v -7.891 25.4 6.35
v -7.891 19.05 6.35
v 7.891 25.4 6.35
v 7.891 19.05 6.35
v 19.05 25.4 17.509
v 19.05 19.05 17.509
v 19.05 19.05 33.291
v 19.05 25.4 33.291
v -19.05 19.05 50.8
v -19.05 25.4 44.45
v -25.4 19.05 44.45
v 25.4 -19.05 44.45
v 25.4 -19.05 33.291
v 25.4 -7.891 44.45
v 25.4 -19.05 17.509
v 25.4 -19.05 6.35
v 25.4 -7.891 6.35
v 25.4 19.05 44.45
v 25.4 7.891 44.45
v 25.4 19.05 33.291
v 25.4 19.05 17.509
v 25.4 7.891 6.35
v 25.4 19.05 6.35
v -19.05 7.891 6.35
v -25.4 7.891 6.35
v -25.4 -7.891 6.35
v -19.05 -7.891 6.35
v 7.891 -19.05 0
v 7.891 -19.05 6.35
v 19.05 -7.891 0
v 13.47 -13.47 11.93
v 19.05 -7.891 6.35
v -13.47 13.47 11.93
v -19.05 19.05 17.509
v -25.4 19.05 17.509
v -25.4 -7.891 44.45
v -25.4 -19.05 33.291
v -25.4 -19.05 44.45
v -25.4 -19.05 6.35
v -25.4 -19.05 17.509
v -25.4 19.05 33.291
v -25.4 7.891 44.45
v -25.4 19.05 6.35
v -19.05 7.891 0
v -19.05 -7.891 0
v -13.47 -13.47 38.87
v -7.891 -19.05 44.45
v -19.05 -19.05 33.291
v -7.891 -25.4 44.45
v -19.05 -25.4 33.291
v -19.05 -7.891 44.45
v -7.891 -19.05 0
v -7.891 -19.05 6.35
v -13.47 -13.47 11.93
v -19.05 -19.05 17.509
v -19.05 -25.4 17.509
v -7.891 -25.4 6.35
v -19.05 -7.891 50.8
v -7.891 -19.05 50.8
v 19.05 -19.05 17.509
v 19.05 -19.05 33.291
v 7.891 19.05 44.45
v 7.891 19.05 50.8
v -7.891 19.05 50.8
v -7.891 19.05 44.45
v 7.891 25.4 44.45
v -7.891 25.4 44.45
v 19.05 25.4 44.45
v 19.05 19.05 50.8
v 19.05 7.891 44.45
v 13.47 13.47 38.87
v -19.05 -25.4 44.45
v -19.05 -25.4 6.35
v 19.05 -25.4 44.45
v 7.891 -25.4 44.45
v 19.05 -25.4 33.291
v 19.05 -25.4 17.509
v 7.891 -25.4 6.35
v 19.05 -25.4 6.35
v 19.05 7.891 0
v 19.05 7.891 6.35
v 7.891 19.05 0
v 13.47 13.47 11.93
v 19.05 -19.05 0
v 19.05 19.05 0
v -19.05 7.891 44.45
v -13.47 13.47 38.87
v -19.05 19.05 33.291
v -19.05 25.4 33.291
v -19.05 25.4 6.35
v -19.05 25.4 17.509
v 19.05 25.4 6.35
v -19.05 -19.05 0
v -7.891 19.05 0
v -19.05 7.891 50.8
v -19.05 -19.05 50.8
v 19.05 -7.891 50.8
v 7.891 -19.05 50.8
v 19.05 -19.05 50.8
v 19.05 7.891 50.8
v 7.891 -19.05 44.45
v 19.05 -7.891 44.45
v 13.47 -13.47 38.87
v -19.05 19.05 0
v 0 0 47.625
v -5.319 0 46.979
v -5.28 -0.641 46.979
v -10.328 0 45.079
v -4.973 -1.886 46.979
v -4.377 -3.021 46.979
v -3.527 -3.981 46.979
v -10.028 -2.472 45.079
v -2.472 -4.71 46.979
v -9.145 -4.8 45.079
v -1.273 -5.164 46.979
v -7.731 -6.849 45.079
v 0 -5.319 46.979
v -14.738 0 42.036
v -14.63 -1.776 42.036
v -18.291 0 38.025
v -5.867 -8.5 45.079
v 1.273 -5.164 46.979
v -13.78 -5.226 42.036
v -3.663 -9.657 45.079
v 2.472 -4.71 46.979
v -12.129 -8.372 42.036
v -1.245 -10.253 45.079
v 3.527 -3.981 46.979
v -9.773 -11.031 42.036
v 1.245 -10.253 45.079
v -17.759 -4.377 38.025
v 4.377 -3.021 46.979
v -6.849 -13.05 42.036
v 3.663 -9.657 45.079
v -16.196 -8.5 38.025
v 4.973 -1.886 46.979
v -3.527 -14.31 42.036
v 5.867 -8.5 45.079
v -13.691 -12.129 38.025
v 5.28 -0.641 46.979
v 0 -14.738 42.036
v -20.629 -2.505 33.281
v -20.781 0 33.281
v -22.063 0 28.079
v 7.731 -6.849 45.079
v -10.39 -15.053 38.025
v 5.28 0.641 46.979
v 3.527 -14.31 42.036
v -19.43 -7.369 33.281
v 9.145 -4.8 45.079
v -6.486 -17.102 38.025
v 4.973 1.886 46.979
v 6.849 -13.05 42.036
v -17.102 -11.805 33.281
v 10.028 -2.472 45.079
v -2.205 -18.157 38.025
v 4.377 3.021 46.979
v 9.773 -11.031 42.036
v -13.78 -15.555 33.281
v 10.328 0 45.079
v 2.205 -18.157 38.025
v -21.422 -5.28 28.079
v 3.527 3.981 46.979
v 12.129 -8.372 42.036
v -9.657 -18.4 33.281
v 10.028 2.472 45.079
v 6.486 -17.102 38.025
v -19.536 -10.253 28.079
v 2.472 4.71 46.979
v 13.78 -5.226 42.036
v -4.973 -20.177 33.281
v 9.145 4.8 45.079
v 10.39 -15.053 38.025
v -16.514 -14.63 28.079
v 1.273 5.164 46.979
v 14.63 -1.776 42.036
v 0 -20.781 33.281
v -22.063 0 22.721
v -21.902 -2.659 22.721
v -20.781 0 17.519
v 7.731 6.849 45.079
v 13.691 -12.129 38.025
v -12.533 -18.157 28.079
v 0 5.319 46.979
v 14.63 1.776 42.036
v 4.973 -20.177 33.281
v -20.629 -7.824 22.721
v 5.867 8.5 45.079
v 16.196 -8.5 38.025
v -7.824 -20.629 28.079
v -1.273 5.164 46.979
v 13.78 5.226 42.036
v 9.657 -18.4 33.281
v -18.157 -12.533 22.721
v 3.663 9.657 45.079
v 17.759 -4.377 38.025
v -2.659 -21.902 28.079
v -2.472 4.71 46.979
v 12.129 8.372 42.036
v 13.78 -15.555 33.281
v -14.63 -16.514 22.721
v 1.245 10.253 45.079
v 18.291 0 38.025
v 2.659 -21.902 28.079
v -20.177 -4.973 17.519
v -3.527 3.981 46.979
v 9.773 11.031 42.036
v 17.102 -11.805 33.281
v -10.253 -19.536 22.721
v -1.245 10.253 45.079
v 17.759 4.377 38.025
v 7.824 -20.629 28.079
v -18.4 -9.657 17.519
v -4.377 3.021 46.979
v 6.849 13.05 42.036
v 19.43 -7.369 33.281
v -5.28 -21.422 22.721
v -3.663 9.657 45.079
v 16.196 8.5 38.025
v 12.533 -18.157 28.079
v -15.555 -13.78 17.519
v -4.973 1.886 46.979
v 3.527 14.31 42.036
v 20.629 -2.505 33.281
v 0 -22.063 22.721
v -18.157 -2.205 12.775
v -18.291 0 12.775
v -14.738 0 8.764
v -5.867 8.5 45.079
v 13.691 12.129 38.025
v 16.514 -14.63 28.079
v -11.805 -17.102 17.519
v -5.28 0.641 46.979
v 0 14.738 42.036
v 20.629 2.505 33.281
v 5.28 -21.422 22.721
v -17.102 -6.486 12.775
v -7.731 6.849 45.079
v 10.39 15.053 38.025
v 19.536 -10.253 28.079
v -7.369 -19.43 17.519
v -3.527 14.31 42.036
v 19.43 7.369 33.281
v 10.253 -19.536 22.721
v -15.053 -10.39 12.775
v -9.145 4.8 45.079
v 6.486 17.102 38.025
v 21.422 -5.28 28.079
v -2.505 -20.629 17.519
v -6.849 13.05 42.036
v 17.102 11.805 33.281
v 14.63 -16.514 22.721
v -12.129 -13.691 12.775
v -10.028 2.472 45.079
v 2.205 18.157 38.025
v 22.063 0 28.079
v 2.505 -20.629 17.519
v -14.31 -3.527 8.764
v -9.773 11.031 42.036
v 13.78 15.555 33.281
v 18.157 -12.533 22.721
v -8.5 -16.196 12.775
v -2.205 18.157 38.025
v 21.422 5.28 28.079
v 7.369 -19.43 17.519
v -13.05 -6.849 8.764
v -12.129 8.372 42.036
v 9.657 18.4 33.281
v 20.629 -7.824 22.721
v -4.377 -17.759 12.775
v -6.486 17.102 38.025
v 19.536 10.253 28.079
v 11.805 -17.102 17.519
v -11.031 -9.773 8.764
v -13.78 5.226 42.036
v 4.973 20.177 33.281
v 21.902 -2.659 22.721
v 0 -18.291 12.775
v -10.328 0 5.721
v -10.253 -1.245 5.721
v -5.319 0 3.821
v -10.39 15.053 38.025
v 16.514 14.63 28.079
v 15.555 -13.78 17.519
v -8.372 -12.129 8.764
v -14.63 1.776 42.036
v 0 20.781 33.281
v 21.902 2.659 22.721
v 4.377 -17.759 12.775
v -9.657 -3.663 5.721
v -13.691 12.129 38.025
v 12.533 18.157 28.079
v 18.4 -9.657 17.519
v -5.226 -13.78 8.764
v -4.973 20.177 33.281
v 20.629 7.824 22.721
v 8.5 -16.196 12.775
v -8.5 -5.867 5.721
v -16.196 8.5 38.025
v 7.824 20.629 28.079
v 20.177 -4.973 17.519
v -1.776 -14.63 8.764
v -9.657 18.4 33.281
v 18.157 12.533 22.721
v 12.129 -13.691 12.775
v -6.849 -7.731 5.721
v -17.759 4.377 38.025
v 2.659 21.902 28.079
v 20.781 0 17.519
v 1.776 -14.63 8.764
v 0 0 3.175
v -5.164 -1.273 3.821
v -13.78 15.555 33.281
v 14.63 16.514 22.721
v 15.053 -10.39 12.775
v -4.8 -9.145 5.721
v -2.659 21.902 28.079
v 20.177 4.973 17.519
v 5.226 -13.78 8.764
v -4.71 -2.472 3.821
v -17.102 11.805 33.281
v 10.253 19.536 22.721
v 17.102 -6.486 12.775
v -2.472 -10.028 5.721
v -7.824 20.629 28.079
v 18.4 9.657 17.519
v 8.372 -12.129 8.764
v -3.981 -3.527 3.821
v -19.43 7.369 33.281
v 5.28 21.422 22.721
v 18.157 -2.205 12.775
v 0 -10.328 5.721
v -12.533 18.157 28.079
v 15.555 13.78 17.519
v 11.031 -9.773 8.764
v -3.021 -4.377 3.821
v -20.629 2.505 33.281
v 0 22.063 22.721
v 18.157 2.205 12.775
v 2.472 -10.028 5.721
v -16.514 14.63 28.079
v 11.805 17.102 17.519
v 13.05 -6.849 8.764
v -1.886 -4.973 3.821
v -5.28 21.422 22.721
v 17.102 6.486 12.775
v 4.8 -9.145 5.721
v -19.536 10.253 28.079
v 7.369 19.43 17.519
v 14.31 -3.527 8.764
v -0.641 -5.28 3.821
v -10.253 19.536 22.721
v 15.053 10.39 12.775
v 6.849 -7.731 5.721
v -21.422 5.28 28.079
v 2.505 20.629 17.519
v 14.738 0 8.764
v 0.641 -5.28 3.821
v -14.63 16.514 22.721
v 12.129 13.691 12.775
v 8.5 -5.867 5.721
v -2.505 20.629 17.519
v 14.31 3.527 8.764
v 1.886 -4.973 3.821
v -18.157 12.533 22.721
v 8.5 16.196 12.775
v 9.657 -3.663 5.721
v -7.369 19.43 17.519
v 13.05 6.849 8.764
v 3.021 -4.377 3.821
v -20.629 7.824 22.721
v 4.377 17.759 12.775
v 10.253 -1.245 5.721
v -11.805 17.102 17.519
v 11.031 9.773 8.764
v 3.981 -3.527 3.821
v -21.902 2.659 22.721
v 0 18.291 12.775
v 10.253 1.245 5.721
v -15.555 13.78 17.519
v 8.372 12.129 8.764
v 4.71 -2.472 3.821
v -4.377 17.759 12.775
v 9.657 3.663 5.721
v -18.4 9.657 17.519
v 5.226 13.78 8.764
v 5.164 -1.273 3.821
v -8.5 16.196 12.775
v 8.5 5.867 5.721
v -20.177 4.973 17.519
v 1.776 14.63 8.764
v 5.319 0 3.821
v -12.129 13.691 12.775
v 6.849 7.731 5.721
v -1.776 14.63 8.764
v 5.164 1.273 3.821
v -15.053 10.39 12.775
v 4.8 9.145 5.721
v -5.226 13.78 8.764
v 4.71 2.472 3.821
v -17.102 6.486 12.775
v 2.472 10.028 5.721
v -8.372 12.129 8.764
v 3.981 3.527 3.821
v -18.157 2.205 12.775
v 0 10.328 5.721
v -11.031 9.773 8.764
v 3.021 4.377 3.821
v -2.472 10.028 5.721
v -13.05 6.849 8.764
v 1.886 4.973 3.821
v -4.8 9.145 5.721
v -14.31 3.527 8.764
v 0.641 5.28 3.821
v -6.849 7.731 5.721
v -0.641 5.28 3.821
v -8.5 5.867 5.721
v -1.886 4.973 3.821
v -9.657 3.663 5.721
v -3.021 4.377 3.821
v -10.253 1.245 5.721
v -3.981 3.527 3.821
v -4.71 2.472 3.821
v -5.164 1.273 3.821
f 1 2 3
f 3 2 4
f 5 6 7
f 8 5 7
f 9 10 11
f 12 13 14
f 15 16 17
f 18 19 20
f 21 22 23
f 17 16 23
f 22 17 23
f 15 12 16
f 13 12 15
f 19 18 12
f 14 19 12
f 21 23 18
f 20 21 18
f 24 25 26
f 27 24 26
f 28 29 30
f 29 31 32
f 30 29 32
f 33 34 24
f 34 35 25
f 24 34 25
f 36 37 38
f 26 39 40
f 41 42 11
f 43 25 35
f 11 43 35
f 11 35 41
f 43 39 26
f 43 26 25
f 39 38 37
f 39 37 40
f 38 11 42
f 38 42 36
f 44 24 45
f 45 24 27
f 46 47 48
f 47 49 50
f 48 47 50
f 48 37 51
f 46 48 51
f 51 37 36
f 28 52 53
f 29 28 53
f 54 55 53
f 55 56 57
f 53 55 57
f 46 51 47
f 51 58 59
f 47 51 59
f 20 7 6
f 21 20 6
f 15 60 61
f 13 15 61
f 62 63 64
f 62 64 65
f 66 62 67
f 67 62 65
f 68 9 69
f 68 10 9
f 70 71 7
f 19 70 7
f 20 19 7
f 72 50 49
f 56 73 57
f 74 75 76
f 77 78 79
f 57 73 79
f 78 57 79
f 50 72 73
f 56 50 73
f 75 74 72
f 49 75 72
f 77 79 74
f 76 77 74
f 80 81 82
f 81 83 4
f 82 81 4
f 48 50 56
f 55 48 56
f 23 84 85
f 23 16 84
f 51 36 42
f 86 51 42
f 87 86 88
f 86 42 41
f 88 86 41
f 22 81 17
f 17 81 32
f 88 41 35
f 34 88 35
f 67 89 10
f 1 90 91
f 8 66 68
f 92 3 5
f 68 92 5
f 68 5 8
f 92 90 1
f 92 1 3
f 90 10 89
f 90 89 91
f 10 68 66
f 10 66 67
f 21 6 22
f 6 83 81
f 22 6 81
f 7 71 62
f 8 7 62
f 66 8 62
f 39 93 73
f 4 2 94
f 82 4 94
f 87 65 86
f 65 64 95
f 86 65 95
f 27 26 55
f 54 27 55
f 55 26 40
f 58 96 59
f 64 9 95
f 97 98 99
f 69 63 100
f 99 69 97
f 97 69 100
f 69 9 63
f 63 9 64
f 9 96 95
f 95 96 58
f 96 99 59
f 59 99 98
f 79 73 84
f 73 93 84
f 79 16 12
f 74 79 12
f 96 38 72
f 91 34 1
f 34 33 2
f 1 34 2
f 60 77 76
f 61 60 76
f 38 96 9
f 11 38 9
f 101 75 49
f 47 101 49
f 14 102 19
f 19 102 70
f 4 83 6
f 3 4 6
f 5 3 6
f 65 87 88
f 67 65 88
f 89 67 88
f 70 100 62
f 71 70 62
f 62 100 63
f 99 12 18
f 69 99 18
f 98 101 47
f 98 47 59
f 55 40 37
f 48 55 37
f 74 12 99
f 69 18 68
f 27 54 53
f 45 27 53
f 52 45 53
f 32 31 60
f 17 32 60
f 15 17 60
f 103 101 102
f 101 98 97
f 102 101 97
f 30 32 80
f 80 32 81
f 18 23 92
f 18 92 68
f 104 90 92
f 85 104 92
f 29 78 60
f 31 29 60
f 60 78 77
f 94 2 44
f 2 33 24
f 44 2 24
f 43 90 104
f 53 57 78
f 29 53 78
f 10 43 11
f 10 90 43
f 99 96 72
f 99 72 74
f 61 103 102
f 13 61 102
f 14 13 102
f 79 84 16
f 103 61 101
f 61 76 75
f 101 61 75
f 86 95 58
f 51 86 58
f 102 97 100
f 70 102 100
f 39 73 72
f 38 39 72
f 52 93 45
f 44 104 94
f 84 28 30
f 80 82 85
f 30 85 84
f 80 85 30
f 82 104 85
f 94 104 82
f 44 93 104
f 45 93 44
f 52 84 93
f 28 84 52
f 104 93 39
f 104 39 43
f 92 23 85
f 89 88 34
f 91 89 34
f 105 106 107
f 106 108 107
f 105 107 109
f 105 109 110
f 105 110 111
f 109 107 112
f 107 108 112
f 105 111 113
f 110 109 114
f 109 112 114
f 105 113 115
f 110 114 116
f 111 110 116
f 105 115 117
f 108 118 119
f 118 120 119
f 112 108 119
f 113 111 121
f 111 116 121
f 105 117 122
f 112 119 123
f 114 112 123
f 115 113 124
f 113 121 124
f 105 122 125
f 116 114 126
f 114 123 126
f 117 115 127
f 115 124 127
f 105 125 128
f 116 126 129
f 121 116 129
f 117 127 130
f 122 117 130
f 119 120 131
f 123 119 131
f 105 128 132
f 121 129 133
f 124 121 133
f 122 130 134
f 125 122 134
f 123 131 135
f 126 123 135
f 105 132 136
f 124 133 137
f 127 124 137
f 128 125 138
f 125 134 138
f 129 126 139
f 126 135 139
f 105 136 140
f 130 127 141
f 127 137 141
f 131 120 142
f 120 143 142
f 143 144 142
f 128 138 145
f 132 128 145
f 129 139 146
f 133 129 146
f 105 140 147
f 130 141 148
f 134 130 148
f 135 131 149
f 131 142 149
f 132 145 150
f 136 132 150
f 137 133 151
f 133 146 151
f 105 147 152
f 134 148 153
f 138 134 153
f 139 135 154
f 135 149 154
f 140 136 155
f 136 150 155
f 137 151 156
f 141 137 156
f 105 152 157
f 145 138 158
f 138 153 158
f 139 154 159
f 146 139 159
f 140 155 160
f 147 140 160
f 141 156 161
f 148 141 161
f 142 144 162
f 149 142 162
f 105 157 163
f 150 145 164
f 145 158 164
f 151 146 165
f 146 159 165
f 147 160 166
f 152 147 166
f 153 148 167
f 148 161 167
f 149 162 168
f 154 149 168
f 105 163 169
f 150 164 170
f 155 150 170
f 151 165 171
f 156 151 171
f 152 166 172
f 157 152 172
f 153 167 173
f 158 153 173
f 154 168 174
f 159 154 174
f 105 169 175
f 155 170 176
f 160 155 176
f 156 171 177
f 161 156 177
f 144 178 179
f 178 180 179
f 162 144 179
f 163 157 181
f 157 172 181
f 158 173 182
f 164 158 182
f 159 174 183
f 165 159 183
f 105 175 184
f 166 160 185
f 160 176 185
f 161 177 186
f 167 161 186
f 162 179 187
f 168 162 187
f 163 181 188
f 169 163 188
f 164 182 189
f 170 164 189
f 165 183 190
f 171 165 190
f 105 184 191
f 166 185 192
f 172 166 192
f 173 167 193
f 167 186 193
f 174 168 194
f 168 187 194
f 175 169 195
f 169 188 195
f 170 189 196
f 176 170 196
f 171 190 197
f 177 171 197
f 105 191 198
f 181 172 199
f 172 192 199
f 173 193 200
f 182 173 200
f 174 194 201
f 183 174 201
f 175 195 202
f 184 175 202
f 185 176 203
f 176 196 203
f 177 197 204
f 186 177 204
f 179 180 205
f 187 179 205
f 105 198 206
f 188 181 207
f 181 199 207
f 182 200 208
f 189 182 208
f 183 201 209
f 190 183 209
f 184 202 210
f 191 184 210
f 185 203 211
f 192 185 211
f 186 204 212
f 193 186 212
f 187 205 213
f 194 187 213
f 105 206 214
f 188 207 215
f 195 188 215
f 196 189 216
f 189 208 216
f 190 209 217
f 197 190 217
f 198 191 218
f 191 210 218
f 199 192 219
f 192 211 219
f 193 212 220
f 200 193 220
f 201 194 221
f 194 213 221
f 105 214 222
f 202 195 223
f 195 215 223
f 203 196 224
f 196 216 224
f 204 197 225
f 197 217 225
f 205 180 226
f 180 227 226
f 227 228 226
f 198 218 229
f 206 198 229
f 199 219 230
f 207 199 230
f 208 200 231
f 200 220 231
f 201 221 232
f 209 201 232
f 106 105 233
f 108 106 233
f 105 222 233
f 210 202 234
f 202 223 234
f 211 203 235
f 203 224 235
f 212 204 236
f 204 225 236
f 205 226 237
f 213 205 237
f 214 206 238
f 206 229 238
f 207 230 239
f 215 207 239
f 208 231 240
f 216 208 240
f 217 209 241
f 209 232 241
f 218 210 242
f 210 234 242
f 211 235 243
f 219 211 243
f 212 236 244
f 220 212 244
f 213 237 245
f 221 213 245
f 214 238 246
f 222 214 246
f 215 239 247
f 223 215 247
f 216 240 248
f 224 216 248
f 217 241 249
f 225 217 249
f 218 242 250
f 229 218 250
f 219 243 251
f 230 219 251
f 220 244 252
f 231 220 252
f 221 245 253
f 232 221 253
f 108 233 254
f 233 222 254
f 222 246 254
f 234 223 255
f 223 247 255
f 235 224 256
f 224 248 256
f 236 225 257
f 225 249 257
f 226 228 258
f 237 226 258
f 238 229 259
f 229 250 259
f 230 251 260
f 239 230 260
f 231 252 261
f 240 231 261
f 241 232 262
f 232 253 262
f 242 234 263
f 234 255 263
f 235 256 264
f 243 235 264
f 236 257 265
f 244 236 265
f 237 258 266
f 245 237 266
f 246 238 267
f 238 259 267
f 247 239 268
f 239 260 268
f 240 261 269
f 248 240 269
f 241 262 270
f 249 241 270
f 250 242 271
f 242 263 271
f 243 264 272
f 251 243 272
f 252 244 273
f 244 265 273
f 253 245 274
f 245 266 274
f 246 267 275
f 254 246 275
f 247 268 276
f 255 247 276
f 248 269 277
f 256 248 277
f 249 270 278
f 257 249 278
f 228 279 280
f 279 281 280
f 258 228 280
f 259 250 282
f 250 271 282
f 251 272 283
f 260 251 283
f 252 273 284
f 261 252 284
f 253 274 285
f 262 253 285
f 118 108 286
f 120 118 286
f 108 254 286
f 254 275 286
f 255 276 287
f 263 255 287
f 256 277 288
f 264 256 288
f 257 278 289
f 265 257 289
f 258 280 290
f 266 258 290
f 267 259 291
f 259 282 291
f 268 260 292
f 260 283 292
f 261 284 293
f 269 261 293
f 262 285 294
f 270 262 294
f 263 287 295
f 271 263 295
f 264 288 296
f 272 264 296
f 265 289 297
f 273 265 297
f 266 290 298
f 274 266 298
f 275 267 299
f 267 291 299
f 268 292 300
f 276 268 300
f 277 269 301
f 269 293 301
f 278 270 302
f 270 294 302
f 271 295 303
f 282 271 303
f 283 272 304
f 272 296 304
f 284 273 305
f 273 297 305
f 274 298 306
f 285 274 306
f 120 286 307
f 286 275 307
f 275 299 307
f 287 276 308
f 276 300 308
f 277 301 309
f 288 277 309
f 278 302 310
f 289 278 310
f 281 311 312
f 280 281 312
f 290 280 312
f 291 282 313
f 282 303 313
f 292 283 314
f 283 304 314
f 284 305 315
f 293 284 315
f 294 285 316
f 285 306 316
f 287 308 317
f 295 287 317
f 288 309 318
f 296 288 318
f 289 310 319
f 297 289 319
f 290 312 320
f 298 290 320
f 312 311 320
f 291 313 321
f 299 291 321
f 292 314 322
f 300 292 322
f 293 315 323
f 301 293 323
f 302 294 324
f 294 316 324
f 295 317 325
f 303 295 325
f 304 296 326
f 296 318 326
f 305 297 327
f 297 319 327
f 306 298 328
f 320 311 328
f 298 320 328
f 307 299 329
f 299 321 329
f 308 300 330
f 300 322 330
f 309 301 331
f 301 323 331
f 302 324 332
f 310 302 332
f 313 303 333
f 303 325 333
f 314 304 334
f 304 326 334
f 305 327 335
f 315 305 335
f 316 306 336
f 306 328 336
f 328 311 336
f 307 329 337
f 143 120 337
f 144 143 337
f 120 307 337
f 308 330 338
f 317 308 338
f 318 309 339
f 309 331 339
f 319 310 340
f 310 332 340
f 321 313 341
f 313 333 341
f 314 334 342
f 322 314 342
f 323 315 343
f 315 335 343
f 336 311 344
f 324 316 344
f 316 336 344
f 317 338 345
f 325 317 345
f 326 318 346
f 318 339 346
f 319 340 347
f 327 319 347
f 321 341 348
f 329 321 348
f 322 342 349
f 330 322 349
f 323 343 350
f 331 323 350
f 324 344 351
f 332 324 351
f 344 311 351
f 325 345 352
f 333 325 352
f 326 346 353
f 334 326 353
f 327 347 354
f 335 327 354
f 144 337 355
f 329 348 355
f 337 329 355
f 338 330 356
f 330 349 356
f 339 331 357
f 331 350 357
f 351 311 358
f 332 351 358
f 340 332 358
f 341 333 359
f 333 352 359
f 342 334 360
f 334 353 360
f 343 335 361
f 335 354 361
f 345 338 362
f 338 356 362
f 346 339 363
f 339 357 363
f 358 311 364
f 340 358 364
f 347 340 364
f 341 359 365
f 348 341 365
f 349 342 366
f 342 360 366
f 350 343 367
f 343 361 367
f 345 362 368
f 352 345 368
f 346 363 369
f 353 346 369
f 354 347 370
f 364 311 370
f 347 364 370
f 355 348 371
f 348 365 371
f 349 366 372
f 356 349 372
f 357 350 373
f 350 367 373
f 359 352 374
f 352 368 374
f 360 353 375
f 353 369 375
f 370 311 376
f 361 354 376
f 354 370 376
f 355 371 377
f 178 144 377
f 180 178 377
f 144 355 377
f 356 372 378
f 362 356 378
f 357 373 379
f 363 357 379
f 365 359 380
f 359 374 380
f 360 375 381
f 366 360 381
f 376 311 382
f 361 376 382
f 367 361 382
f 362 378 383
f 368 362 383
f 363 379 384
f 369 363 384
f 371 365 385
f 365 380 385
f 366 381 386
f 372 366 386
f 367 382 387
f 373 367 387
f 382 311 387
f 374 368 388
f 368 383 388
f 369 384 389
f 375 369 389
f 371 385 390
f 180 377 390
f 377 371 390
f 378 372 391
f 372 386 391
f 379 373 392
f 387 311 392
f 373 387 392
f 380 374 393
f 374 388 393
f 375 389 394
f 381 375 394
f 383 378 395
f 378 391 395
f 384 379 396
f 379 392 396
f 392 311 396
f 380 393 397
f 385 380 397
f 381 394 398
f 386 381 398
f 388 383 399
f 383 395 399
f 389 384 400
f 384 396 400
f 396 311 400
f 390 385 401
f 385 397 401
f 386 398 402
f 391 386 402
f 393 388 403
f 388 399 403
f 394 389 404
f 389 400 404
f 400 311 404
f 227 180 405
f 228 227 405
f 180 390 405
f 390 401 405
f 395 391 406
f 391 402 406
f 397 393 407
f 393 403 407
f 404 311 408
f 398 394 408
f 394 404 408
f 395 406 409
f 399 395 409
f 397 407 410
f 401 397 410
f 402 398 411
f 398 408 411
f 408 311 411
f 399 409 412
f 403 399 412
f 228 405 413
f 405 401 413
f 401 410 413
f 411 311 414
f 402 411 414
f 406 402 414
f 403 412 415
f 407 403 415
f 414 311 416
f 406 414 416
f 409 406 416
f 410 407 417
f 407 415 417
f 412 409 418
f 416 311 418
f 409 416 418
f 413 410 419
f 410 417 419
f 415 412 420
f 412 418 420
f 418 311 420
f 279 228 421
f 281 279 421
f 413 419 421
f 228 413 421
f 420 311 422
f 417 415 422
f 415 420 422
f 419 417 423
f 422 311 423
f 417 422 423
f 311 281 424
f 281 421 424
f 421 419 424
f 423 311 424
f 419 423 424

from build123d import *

# Parameters (mm, degrees)
F0_W     = 50.8
F0_H     = 50.8
F1_DEPTH = 50.8
F3_DEPTH = 50.801
F5_DEPTH = 50.801
F7_DEPTH = 50.801
F8_SIZE  = 6.34999


# Not quite as in the source:
# - a fillet or chamfer is up to 0.001 mm smaller than in the source, because OpenCascade refuses the exact size


with BuildPart() as f1:
    # F0 (on Top) → F1 (new body)
    with BuildSketch(Plane.XY):
        Rectangle(F0_W, F0_H)
    extrude(amount=F1_DEPTH)

    # F2 (on face) → F3 (cut, through all)
    with BuildSketch(Plane.XY.offset(50.8)):
        Polygon((7.8907683632, 19.05), (-7.8907683632, 19.05), (-19.05, 7.8907683632), (-19.05, -7.8907683632), (-7.8907683632, -19.05), (7.8907683632, -19.05), (19.05, -7.8907683632), (19.05, 7.8907683632), align=None)
    extrude(amount=-F3_DEPTH, mode=Mode.SUBTRACT)

    # F4 (on face) → F5 (cut, through all)
    with BuildSketch(Plane(origin=(-25.4, 0, 0), x_dir=(0, -1, 0), z_dir=(-1, 0, 0))):
        Polygon((-7.8907683632, 6.35), (7.8907683632, 6.35), (19.05, 17.5092316368), (19.05, 33.2907683632), (7.8907683632, 44.45), (-7.8907683632, 44.45), (-19.05, 33.2907683632), (-19.05, 17.5092316368), align=None)
    extrude(amount=-F5_DEPTH, mode=Mode.SUBTRACT)

    # F6 (on face) → F7 (cut, through all)
    with BuildSketch(Plane.XZ.offset(25.4)):
        Polygon((-7.8907683632, 6.35), (7.8907683632, 6.35), (19.05, 17.5092316368), (19.05, 33.2907683632), (7.8907683632, 44.45), (-7.8907683632, 44.45), (-19.05, 33.2907683632), (-19.05, 17.5092316368), align=None)
    extrude(amount=-F7_DEPTH, mode=Mode.SUBTRACT)

    # F8 (size 6.35 in the source; OpenCascade refuses exactly that, so slightly less here)
    f8_edges = [f1.edges().sort_by_distance(p)[0] for p in [
        (25.4, 0, 0),
        (0, -25.4, 0),
        (25.4, -25.4, 25.4),
        (25.4, 25.4, 25.4),
        (25.4, 0, 50.8),
        (0, 25.4, 50.8),
        (-25.4, 25.4, 25.4),
        (0, 25.4, 0),
        (-25.4, 0, 0),
        (-25.4, -25.4, 25.4),
        (-25.4, 0, 50.8),
        (0, -25.4, 50.8),
    ]]
    chamfer(f8_edges, length=F8_SIZE)


with BuildPart() as f11:
    # F9 (on Front) → F11 (revolve)
    with BuildSketch(Plane.XZ):
        with BuildLine():
            Line((0, 3.175), (0, 47.625))
            ThreePointArc((0, 47.625), (-22.225, 25.4), (0, 3.175))
        make_face()
    revolve(axis=Axis((0, 0, 27.8375800699), (0, 0, 1)))


solid = Compound([f1.part, f11.part])
